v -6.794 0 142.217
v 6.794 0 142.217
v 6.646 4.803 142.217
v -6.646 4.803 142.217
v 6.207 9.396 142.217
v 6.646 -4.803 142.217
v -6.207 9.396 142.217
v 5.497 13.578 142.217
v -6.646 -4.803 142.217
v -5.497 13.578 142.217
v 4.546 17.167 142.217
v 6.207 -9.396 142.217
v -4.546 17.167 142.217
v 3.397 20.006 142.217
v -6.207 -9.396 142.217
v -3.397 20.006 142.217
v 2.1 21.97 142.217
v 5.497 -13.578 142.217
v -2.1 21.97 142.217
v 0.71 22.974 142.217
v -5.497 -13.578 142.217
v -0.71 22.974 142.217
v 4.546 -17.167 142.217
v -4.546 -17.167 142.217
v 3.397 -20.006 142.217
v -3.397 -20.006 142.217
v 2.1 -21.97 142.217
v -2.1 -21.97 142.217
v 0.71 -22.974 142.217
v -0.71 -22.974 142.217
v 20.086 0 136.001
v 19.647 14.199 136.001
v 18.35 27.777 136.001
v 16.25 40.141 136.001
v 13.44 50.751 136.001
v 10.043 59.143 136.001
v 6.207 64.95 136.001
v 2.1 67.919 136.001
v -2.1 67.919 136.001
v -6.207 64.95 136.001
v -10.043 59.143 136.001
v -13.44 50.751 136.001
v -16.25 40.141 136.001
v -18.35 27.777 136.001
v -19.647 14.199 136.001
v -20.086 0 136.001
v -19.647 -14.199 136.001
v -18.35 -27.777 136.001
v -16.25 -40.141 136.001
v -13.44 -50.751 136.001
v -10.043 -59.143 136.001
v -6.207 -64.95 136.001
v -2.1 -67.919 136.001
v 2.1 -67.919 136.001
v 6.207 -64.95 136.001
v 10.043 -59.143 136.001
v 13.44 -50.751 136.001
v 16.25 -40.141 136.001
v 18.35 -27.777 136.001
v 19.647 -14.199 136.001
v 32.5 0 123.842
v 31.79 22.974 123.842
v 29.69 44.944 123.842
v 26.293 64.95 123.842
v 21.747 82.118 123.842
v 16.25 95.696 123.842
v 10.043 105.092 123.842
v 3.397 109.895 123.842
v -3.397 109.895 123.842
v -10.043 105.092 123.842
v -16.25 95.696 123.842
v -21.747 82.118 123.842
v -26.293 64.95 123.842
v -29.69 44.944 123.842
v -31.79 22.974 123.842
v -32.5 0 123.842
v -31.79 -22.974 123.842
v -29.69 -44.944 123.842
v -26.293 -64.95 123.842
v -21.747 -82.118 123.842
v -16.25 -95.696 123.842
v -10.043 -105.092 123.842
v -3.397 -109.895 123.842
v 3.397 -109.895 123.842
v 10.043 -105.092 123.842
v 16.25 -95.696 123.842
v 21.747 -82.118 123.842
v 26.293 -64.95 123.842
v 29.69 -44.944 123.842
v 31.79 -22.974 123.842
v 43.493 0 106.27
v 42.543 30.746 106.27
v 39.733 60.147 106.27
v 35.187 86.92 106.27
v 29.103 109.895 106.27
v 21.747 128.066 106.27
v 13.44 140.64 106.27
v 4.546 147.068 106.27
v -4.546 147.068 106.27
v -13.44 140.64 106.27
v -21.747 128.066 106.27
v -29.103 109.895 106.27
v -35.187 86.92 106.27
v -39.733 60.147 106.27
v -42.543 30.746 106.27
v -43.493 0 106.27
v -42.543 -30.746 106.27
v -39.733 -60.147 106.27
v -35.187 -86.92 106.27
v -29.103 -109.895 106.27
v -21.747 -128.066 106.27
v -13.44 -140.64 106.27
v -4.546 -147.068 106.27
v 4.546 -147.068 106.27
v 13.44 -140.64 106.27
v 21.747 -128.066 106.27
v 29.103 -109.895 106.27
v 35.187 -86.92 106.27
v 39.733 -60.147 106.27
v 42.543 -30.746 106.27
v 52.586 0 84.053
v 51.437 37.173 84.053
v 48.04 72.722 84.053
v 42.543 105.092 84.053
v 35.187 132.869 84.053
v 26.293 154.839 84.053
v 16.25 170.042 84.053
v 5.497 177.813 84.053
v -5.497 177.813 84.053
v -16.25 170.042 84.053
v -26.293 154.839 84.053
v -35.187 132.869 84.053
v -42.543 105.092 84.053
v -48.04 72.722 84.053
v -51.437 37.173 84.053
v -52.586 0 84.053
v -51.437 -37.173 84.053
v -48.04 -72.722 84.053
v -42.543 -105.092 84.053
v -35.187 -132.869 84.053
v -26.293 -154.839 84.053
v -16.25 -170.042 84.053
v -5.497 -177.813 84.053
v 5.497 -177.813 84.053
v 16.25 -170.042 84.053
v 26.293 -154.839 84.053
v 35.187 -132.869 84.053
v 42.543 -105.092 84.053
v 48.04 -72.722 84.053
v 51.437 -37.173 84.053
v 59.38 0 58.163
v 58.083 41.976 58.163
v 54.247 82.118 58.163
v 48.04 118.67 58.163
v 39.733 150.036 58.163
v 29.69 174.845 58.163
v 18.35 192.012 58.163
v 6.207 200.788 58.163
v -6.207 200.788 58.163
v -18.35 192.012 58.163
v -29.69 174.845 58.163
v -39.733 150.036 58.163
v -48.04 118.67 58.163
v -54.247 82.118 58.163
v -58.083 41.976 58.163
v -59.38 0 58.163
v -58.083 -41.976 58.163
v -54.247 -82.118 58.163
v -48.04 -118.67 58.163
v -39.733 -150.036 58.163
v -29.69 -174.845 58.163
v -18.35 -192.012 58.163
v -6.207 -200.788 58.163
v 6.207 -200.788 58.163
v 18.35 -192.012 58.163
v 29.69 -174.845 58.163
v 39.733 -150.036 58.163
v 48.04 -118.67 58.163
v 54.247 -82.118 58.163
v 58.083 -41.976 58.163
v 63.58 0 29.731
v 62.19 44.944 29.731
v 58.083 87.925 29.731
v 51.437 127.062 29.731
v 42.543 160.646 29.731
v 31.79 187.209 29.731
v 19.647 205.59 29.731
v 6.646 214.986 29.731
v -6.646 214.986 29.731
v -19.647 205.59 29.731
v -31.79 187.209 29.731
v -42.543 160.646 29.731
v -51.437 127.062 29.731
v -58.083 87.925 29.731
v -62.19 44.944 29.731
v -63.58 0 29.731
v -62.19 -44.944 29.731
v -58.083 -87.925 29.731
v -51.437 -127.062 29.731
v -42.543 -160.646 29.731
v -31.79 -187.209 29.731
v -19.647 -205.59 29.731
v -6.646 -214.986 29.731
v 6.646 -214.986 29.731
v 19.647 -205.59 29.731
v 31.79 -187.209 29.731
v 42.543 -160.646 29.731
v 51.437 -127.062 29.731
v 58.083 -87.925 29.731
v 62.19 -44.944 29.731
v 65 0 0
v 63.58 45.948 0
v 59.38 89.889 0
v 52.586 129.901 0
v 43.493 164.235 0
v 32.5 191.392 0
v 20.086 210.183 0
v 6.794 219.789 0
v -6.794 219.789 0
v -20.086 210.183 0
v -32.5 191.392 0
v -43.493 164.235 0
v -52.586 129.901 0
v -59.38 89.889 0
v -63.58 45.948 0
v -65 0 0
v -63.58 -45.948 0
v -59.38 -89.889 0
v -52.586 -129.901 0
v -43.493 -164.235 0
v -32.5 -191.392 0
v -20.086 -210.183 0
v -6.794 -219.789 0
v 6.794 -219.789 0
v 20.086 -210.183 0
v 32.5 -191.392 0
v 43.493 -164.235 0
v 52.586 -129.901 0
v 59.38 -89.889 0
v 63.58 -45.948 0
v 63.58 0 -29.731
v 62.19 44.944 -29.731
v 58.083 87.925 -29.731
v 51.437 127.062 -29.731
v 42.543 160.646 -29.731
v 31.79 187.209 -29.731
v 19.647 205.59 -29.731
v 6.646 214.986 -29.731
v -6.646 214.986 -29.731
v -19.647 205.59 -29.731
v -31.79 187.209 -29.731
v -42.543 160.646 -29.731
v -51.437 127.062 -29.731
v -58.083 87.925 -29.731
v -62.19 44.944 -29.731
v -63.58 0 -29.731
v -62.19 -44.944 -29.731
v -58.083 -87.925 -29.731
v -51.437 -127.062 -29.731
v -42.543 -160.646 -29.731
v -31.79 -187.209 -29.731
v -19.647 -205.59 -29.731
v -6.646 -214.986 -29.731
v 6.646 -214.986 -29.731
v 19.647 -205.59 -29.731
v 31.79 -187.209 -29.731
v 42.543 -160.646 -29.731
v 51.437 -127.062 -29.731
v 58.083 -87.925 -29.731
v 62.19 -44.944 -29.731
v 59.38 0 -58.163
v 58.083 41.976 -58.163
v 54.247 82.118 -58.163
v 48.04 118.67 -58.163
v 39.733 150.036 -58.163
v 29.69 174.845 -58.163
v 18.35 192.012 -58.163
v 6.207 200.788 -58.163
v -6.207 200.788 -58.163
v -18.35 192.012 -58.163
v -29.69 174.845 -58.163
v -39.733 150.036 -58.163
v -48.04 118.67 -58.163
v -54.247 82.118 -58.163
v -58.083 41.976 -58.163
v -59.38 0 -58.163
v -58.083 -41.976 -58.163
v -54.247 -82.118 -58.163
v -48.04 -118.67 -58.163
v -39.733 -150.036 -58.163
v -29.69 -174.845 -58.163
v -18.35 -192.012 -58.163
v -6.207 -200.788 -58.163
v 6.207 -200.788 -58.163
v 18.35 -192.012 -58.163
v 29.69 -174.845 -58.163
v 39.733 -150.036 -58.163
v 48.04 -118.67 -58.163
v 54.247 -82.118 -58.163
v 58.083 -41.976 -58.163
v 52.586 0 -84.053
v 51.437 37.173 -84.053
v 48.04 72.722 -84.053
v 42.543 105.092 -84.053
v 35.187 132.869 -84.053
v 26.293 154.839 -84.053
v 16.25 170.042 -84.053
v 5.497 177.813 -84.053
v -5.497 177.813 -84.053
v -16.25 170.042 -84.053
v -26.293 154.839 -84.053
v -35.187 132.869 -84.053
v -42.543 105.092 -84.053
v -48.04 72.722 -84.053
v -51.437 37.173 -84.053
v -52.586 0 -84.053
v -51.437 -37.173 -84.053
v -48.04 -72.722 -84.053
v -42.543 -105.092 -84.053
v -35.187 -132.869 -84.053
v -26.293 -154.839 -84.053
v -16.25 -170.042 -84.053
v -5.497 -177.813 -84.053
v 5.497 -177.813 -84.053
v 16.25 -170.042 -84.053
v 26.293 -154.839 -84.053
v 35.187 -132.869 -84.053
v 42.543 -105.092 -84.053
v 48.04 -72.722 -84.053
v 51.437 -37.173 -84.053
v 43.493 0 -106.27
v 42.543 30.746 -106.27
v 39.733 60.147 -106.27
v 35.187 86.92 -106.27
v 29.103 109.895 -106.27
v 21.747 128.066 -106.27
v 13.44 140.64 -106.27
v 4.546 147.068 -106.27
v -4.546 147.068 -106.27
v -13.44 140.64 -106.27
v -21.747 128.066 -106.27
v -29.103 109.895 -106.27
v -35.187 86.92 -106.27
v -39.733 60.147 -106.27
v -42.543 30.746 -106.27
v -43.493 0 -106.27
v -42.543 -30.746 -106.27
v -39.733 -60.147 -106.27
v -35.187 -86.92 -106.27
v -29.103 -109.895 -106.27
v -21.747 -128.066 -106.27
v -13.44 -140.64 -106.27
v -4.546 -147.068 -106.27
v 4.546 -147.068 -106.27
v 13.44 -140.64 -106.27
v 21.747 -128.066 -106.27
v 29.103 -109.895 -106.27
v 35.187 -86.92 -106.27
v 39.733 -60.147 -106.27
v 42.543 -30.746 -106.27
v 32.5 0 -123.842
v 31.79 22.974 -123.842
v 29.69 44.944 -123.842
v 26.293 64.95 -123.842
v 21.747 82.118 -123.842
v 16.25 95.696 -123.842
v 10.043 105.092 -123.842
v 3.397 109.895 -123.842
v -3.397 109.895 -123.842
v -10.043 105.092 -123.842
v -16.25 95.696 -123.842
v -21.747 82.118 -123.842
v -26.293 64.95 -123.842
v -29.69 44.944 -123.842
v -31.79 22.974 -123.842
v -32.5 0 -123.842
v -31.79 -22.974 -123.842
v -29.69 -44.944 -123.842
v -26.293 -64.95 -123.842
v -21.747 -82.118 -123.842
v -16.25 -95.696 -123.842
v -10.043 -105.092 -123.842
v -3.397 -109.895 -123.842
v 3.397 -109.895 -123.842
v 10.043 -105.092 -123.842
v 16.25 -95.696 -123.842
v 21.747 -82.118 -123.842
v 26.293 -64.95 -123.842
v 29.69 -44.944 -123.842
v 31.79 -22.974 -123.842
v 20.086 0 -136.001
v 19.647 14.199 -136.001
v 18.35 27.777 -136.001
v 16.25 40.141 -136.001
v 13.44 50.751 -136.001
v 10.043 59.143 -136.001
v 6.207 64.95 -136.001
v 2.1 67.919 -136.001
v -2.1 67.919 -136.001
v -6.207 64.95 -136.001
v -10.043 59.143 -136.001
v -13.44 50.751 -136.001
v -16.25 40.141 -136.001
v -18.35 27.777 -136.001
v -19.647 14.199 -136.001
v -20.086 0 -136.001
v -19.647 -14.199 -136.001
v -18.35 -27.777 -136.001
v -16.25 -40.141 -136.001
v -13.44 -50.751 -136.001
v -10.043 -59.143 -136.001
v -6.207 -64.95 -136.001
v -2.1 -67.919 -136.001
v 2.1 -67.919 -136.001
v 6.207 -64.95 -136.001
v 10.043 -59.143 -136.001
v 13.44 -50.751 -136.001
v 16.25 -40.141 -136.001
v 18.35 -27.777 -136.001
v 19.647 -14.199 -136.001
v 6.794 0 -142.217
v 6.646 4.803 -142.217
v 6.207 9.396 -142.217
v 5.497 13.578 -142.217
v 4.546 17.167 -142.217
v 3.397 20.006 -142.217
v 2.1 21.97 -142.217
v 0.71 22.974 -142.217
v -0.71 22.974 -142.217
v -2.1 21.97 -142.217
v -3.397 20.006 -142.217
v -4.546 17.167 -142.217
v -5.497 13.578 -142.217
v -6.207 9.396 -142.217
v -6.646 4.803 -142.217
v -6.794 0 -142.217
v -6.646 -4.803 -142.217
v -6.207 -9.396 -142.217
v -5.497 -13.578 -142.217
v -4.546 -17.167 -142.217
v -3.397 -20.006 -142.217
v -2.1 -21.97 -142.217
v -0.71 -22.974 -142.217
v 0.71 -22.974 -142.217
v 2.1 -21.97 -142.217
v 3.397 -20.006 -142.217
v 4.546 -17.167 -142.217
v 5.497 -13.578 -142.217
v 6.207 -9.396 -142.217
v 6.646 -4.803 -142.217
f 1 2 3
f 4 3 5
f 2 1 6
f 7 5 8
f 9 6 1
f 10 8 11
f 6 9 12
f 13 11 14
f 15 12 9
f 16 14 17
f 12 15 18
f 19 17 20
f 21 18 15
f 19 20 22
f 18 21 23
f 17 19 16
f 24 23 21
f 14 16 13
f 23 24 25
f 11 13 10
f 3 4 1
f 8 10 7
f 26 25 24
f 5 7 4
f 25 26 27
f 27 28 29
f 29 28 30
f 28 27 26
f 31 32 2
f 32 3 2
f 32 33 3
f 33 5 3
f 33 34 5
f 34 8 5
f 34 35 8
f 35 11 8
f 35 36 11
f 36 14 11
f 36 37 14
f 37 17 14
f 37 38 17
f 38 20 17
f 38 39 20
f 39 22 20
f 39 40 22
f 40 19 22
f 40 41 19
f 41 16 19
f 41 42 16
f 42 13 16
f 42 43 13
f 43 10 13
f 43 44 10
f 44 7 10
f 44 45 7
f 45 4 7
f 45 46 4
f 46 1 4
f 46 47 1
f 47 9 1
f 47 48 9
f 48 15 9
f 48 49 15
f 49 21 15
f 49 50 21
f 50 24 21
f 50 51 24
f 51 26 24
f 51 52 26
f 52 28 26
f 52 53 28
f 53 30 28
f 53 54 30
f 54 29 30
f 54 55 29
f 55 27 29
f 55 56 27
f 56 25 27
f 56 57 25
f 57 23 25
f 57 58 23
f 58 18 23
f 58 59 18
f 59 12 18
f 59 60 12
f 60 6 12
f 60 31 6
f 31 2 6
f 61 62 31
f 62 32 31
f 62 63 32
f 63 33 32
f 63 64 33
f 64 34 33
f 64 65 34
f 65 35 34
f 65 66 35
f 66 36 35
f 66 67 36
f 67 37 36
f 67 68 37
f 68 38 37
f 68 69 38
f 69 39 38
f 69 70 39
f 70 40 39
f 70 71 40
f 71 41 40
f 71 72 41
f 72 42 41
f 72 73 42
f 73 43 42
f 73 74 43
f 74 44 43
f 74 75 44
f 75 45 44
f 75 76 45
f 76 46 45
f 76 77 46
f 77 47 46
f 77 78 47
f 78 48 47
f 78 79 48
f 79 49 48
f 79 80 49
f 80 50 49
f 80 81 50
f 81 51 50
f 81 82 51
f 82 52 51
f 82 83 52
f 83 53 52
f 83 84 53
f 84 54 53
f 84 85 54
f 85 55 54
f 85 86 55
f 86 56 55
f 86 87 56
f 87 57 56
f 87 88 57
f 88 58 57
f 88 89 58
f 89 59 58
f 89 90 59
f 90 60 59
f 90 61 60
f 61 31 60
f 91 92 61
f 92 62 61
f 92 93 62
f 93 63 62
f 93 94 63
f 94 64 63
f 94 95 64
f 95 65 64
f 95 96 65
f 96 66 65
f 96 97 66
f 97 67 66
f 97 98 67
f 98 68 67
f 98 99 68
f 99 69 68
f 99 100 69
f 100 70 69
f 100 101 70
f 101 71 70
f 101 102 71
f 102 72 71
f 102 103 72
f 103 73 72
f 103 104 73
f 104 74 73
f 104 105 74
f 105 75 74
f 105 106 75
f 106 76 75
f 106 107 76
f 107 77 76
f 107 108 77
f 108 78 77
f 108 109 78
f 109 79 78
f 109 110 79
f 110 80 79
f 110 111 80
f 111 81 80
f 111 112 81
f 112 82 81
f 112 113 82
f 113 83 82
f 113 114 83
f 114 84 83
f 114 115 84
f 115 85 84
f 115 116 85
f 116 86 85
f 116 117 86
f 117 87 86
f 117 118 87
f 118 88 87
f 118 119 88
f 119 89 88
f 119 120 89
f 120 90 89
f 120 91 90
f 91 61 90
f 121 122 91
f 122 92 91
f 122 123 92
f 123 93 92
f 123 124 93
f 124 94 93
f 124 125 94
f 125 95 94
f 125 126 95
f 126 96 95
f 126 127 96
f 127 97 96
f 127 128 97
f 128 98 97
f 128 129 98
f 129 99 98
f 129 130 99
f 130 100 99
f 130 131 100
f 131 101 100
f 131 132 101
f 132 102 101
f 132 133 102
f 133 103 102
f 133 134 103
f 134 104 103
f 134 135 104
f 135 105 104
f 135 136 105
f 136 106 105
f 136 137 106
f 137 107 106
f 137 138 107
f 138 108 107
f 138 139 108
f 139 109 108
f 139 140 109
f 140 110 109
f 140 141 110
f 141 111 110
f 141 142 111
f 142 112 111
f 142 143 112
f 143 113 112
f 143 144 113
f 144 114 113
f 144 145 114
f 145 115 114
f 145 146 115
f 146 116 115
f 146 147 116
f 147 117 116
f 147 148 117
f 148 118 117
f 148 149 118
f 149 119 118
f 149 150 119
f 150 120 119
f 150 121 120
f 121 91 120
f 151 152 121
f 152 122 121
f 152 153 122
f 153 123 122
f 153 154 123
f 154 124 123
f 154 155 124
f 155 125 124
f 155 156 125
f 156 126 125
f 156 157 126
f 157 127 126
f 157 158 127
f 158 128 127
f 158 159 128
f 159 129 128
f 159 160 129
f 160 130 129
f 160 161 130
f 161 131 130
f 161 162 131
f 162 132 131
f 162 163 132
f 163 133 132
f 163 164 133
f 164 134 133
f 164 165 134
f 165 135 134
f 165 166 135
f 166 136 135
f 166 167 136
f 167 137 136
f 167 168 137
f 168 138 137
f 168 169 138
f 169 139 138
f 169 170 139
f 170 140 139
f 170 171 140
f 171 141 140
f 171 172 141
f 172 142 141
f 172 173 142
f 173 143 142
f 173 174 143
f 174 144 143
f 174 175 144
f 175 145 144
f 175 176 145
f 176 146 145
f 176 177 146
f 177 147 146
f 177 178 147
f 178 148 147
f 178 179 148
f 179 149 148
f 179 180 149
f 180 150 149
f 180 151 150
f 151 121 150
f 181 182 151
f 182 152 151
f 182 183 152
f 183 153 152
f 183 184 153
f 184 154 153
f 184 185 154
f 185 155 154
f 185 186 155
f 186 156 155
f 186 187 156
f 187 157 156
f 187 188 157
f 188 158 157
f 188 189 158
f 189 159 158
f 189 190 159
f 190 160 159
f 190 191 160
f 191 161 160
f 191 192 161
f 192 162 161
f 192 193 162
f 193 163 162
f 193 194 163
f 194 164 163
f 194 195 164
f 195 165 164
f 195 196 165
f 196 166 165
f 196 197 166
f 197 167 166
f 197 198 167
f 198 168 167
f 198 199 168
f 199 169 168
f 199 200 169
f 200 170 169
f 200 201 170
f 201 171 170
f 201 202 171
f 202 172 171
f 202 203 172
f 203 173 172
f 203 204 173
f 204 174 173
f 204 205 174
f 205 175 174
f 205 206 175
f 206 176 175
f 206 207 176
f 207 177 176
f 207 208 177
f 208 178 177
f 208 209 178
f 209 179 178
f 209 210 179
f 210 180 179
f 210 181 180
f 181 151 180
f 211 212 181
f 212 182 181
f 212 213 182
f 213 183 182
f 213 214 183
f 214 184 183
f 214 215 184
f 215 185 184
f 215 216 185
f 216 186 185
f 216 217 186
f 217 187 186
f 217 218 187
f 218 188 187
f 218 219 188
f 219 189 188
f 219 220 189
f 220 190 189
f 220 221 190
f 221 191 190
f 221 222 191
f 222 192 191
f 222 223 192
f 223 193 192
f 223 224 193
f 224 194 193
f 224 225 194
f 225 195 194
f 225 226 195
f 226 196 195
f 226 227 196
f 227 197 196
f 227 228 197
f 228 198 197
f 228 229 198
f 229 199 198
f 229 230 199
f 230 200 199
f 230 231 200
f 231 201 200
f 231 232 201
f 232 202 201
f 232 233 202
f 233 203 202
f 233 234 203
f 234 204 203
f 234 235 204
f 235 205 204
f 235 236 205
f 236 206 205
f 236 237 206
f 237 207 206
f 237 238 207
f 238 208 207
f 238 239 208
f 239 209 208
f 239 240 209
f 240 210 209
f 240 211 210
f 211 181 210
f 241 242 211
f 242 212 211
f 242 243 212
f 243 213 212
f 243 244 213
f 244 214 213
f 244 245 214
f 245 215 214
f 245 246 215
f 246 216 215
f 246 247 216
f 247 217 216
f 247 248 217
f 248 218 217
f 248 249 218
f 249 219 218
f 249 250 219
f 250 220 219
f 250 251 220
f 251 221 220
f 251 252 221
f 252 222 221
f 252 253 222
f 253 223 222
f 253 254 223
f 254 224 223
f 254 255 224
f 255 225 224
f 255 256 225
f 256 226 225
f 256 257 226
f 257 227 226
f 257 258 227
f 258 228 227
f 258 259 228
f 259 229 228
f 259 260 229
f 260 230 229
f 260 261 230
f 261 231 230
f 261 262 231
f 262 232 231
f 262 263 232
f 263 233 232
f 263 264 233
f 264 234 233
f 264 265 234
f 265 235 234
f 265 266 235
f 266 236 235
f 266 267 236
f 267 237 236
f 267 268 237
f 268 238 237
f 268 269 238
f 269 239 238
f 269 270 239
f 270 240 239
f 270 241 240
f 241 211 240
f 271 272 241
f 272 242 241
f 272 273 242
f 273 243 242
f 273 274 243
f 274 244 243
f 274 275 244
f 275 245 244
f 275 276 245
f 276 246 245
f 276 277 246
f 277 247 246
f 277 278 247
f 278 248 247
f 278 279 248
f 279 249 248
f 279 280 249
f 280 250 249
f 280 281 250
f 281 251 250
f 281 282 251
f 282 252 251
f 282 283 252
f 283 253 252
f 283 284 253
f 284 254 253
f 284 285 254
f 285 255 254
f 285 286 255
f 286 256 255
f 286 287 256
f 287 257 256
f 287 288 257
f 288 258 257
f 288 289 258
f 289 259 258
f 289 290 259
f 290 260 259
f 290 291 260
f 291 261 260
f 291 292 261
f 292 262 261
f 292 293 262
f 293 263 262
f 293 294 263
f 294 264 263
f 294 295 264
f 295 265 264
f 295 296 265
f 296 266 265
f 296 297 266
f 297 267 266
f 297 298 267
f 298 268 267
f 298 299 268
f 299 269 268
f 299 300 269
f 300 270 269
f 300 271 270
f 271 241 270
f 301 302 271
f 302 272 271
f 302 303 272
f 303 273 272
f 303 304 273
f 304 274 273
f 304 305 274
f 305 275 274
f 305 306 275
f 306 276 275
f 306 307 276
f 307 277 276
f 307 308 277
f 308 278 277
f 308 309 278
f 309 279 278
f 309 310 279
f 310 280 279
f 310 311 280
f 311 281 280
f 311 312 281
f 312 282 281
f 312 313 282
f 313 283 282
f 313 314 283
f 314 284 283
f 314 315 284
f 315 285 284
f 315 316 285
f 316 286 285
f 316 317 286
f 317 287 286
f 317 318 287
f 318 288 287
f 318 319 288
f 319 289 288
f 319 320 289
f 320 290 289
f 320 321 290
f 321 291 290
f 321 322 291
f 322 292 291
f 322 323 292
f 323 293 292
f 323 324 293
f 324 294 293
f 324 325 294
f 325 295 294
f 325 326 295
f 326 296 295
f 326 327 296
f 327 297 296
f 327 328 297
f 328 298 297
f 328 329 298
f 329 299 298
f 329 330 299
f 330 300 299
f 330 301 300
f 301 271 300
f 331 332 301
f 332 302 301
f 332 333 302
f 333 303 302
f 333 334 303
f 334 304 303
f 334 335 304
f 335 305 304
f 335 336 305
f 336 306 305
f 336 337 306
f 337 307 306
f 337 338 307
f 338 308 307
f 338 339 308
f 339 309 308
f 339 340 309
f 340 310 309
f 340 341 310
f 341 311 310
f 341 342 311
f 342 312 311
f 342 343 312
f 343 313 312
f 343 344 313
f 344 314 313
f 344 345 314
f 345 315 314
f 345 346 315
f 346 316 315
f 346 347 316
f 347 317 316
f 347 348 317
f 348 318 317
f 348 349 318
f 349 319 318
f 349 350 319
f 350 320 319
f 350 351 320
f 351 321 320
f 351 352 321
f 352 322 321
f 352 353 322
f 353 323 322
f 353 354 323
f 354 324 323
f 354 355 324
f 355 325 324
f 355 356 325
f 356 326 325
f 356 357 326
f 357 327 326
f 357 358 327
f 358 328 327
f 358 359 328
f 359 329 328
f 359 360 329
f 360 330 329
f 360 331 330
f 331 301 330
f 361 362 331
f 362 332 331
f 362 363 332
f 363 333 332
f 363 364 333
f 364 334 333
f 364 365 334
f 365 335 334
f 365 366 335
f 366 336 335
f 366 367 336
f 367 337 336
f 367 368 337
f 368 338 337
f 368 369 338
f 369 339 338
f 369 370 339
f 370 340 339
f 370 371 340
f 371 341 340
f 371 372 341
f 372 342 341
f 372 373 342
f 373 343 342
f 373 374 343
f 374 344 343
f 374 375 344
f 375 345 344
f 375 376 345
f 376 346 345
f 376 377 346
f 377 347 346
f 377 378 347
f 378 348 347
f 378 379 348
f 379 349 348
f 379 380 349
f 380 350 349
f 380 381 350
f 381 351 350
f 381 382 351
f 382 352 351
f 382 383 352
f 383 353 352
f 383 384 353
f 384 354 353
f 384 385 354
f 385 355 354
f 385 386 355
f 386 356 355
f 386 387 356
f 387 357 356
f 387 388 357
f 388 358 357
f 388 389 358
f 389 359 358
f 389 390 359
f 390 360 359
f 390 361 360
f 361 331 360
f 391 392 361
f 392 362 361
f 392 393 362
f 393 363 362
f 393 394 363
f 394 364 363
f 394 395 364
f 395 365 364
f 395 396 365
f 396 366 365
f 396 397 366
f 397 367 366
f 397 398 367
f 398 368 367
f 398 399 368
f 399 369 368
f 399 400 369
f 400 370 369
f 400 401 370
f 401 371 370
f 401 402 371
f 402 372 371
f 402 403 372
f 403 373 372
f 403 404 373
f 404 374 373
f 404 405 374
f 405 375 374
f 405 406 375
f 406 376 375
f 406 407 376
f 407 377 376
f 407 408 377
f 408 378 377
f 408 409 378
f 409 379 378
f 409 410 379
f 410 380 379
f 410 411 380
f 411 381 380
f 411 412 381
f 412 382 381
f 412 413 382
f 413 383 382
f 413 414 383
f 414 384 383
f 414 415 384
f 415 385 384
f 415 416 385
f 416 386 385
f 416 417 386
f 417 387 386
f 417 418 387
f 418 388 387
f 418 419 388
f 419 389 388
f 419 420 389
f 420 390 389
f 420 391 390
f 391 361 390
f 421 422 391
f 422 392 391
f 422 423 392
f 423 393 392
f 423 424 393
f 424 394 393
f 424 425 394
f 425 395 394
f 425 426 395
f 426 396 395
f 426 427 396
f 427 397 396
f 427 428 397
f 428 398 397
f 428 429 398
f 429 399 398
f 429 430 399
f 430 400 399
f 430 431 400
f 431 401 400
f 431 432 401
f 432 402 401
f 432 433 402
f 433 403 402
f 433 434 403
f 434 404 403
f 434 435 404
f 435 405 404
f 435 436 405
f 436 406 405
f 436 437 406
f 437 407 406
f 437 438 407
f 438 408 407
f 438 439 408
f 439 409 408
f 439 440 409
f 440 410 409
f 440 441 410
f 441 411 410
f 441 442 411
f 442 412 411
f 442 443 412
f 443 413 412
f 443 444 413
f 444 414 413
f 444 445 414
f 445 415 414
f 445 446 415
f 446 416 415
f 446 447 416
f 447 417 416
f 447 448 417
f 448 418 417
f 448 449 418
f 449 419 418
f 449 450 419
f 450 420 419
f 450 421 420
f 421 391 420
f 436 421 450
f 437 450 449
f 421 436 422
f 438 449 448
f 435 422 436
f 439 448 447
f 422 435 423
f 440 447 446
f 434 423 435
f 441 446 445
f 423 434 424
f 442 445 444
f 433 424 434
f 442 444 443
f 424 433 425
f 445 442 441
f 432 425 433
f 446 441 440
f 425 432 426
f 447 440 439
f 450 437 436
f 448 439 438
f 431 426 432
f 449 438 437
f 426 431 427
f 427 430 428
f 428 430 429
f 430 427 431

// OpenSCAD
// Generated by SolidPython 1.0.1 on 2020-07-29 00:46:47


scale(v = [5, 17, 11]) {
	sphere(r = 13);
}
/***********************************************
*********      SolidPython code:      **********
************************************************
 
# import packages: SolidPython
from solid import *
from solid.utils import *
from itertools import chain, combinations, permutations


class Resize:

    def __init__(self, scad_file):
        self.scad_file = scad_file
        #self.scad_file = import_scad(scad_file)
        # cone/cylinder param:
        self.r1 = 0
        self.r2 = 0
        self.h = 0
        # rectangular prism param:
        self.w = 0
        self.l = 0
        # ellipse param:
        self.r = 0

    # import OpenScad code (file name corresponds to shape)


    # classify shape + parameters
    def assign(self, param1, param2, param3):
        if self.scad_file == 'cone.scad':
            self.r1 = param1
            self.r2 = param2
            self.h = param3
        elif self.scad_file == 'cylinder.scad':
            self.r1 = param1
            self.r2 = param2
            self.h = param3
        elif self.scad_file == 'rectangularPrism.scad':
            self.h = param1
            self.l = param2
            self.w = param3
        else:
            self.r = param1
            self.h = param2

    # resize parameters
    def iterate(self):
        x = range(3, 20, 2)
        i = 1
        if self.scad_file == 'cone.scad':
            tempList = list(permutations(x, 2))
            for temp in tempList:
                param1 = temp[0]
                param2 = temp[1]
                filepath = 'produced_scad_files/' + 'cone' + str(param1) + '_' + str(param2) + '_' + '.scad'
                scad_render_to_file(cylinder(h=param1, r1=param2, r2=0), filepath)

        elif self.scad_file == 'cylinder.scad':
            tempList = list(permutations(x, 3))
            for temp in tempList:
                param1 = temp[0]
                param2 = temp[1]
                filepath = 'produced_scad_files/' + 'cylinder' + str(param1) + '_' + str(param2) + '_' + '.scad'
                scad_render_to_file(cylinder(h=param1, r1=param2, r2=param2), filepath)

        elif self.scad_file == 'rectangularPrism.scad':
            tempList = list(permutations(x, 3))
            for temp in tempList:
                param1 = temp[0]
                param2 = temp[1]
                param3 = temp[2]
                filepath = 'produced_scad_files/' + 'rectangularPrism' + str(param1) + '_' + str(param2) + '_' + str(
                    param3) + '.scad'
                scad_render_to_file(cube(size=(param1, param2, param3)), filepath)

        elif self.scad_file == 'ellipse.scad':
            tempList = list(permutations(x, 4))
            for temp in tempList:
                param1 = temp[0]
                param2 = temp[1]
                param3 = temp[2]
                param4 = temp[3]
                filepath = 'produced_scad_files/' + 'ellipse' + str(param1) + '_' + str(param2) + '_' + str(param3) + '_' + str(param4) + '.scad'
                scad_render_to_file(scale([param1, param2, param3])(sphere(r=param4)), filepath)

    def render_to_scadfile(self):
        scad_render_to_file(scad, 'example.scad') 
 
************************************************/
